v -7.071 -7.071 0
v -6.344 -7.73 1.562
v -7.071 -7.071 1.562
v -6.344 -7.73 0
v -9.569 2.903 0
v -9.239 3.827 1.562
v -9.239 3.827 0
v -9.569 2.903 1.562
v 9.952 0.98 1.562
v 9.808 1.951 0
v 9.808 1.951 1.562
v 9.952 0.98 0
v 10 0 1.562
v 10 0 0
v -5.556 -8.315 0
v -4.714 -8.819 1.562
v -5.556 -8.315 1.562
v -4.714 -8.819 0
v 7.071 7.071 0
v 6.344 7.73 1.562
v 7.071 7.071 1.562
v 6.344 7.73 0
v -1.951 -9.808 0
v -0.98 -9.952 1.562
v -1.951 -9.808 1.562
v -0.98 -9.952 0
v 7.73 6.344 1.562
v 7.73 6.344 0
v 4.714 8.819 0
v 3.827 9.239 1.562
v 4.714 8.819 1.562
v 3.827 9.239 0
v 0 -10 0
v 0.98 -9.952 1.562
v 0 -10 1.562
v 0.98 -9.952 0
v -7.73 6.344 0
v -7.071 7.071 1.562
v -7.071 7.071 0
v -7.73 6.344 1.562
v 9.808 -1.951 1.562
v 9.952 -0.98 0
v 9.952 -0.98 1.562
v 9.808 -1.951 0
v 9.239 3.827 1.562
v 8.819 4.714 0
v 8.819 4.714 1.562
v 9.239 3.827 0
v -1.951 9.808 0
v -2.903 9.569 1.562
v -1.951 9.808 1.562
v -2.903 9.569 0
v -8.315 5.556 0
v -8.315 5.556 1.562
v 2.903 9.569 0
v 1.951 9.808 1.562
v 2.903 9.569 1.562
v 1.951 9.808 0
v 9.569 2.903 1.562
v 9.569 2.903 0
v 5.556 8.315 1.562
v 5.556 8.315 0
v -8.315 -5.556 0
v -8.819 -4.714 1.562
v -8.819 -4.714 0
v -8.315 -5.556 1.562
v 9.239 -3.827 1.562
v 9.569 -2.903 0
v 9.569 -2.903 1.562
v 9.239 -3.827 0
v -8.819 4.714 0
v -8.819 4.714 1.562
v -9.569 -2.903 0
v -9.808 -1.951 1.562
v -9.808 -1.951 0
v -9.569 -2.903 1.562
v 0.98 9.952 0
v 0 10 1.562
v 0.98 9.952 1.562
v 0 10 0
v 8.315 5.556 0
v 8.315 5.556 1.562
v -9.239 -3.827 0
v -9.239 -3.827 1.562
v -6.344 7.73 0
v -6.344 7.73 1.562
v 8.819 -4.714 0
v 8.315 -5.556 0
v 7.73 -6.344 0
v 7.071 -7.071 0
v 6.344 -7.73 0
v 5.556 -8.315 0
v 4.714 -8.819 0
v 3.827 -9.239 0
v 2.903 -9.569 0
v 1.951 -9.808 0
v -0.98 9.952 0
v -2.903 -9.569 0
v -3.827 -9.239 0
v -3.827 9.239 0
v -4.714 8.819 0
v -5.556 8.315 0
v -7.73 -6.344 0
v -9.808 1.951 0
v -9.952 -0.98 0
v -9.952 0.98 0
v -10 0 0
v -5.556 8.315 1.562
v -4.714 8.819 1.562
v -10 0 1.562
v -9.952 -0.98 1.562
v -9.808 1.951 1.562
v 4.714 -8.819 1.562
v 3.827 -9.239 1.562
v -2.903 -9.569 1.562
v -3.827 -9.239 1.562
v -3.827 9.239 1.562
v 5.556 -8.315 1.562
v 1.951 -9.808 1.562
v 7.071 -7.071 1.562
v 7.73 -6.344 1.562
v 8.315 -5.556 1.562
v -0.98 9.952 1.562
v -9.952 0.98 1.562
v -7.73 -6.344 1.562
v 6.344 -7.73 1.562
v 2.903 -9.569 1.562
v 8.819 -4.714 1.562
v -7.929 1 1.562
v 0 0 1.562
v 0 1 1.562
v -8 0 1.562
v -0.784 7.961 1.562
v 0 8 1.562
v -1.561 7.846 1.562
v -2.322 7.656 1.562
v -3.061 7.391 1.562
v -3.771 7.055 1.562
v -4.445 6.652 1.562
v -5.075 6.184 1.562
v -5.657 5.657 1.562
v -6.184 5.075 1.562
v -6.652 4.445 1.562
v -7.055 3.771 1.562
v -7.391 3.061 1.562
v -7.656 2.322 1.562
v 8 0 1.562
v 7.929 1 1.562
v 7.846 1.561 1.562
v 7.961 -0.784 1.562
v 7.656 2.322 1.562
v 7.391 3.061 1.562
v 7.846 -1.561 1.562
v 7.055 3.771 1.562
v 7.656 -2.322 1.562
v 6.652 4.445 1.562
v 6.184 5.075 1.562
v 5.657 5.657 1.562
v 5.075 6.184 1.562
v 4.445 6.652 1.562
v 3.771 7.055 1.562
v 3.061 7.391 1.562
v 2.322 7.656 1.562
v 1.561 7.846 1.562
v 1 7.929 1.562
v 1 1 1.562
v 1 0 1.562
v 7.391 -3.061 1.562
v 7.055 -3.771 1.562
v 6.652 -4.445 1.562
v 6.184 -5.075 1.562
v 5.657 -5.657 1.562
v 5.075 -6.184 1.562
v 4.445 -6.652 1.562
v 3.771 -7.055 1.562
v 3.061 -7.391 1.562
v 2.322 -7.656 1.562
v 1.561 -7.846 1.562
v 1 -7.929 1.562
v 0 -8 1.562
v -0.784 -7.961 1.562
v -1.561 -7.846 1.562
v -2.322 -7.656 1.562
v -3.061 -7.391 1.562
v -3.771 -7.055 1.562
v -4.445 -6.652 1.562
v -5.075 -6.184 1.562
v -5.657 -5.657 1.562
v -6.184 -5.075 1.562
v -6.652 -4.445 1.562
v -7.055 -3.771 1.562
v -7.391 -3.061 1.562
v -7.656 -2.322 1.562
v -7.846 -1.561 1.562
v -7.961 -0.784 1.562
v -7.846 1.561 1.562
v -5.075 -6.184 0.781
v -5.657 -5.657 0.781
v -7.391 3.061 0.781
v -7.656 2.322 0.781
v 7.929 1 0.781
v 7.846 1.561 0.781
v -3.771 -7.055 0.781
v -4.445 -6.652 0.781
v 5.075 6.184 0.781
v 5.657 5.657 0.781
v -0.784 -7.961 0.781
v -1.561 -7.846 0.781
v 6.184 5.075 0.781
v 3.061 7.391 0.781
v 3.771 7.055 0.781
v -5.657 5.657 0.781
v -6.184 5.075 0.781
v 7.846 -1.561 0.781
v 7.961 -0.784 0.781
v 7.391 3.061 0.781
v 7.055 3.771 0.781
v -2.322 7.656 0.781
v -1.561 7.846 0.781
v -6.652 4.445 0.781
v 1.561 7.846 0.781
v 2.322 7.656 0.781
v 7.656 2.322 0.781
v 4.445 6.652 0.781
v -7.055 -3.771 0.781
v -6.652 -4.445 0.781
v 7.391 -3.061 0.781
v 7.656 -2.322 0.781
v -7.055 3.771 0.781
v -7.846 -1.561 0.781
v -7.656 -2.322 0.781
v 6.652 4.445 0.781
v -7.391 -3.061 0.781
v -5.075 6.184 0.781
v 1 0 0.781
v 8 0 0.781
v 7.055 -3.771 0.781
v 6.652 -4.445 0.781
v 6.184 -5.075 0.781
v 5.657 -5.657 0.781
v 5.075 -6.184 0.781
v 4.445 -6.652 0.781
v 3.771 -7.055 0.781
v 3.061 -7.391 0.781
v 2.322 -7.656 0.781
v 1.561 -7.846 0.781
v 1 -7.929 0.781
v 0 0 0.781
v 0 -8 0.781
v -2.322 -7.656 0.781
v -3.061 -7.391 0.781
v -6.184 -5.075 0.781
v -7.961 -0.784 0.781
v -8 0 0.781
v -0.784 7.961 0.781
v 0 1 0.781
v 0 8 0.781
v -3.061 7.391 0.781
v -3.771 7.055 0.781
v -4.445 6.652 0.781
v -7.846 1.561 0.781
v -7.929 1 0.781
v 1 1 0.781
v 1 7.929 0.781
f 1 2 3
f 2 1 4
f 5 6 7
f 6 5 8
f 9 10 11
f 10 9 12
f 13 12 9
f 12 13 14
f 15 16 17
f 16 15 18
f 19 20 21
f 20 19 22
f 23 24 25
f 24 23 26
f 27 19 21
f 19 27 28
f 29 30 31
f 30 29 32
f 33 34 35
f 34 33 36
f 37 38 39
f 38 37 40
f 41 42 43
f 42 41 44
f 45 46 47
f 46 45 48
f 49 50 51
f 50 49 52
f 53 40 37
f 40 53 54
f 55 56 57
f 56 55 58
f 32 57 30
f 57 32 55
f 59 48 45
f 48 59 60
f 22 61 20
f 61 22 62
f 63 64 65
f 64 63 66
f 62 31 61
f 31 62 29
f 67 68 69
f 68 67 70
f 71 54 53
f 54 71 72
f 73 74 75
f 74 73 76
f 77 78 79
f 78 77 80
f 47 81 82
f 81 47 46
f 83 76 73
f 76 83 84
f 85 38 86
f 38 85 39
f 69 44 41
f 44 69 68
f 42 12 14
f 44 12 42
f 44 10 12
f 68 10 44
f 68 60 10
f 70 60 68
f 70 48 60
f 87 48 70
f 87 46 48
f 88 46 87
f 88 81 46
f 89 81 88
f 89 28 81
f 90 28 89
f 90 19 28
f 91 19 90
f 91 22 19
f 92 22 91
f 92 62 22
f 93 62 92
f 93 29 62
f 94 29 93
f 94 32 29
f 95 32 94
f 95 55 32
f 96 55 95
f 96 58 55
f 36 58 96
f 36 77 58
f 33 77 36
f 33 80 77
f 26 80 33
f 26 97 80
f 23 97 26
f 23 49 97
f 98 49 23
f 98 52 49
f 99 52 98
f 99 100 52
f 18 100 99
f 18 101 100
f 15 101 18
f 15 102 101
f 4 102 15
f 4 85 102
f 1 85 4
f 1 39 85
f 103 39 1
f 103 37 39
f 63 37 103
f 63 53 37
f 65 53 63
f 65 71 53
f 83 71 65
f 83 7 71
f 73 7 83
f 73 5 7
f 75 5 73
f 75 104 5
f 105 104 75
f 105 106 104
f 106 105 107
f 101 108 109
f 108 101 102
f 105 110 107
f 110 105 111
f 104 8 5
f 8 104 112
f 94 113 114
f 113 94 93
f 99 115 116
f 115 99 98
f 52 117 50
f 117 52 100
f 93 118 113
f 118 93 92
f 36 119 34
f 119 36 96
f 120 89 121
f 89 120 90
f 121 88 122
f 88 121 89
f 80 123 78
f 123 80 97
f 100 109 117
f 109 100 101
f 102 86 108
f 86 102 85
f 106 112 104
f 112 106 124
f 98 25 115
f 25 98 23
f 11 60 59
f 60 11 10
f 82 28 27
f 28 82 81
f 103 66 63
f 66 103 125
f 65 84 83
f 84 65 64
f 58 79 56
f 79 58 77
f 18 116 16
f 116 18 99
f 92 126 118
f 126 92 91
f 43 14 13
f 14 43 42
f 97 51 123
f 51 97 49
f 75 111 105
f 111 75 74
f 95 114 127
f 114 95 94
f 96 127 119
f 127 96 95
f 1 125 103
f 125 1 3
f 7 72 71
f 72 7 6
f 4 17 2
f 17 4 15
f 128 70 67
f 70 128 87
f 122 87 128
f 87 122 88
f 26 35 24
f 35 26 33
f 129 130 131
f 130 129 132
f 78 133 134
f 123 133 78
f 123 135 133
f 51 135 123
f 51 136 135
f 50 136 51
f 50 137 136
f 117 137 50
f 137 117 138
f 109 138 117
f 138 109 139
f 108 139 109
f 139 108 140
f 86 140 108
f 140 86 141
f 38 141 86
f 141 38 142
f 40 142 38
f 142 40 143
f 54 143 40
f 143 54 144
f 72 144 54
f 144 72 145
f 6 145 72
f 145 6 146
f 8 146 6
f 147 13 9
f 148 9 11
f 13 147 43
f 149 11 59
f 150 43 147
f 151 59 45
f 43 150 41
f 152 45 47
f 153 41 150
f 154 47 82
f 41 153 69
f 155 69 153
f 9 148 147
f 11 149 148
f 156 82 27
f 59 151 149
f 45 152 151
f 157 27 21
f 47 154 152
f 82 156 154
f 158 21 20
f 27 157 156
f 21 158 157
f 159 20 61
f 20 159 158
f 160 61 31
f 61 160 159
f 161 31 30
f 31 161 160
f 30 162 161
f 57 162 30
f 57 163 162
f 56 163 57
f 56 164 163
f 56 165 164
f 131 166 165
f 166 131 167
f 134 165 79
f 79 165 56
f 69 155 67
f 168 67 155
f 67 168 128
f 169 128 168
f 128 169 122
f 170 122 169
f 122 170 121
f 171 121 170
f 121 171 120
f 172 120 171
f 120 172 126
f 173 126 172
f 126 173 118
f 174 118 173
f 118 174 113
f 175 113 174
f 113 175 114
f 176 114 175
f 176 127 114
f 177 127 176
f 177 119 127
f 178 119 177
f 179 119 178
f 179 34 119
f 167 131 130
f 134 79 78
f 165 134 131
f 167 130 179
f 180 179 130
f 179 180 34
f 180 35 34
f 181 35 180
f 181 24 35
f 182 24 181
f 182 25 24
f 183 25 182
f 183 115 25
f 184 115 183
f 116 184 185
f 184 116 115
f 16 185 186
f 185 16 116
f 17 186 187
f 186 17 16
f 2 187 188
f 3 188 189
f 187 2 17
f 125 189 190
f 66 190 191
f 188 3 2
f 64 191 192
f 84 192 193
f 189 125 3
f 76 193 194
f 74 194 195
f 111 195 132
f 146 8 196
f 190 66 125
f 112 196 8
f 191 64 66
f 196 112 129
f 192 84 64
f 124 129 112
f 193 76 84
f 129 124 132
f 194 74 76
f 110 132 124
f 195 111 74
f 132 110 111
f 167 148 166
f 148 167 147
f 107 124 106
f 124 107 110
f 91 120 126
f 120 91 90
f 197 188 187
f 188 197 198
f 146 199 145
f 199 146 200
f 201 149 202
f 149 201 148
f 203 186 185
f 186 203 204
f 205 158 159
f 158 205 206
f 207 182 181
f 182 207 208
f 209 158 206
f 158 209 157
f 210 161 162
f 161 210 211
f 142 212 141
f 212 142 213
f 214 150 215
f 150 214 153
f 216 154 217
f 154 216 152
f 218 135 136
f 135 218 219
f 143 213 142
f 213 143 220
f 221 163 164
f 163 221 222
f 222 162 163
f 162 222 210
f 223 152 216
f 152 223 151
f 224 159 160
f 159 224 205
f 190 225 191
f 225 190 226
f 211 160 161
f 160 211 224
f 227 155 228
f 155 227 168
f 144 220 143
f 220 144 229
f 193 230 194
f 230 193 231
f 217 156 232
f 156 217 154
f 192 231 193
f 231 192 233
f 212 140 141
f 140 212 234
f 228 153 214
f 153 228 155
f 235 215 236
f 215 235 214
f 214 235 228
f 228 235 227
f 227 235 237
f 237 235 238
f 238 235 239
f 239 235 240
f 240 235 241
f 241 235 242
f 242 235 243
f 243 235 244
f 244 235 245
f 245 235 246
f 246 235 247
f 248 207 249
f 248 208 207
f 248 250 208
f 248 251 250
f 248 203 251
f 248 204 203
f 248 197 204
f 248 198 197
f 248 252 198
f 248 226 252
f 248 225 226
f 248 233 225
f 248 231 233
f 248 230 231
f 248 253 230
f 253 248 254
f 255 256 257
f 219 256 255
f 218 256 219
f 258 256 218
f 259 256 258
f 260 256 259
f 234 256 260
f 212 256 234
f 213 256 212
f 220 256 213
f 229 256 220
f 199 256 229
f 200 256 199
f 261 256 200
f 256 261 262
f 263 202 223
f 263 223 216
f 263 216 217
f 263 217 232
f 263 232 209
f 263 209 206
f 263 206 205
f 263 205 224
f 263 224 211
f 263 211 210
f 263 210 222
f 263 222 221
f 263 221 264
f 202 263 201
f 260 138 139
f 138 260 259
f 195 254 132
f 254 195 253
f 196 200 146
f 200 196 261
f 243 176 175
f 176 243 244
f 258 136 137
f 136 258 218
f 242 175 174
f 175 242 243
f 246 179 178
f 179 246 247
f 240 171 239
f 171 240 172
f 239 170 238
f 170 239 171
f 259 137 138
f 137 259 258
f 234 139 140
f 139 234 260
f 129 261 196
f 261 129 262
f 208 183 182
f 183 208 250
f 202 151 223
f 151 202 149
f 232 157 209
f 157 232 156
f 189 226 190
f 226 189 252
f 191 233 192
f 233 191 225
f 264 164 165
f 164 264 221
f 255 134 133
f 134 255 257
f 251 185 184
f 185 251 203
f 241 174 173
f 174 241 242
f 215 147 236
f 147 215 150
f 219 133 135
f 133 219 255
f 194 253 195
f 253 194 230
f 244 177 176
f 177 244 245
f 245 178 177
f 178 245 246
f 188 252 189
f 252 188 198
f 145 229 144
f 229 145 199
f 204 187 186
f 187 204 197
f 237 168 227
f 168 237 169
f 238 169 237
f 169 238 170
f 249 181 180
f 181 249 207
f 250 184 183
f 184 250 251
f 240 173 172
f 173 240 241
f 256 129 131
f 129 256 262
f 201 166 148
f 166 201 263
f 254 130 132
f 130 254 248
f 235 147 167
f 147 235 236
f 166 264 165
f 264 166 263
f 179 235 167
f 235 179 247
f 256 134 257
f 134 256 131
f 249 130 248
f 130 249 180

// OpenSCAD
$fn = 64;

size_index = 100;
button_radius = size_index/10;
rim_size = size_index/100;
internal_radius = button_radius - rim_size*2;
//button_height = 1.8;
button_height = size_index/64;
button_drop = button_height/2;
font_size = size_index/16;

text = "Align";
 font = "Liberation Sans";
 
 valign = [
   [  0, "top"],
   [ 40, "center"],
   [ 75, "baseline"],
   [110, "bottom"]
 ];
 
union() {
    difference() {
        cylinder(r = button_radius, h = button_height);
        translate([0, 0, button_drop]) {
            cylinder(r = internal_radius, h = button_drop);
        }
    }
    translate([-internal_radius,0,button_drop]) {
        cube(size=[internal_radius*2, rim_size, button_drop]);
    }
    translate([0,-internal_radius,button_drop]) {
        cube(size=[rim_size, internal_radius*2, button_drop]);
    }
}


/*
content = "RK";
font = "Liberation Sans";

translate ([-(font_size),-(font_size/2),0]) {
   linear_extrude(height = button_height) {
       text("RK", font = font, size = font_size);
     }
 }
*/
 /*
projection() {
    translate([0,0,button_drop*sqrt(2)]) {
        text("asdf", halign=50);
    }
}
*/
